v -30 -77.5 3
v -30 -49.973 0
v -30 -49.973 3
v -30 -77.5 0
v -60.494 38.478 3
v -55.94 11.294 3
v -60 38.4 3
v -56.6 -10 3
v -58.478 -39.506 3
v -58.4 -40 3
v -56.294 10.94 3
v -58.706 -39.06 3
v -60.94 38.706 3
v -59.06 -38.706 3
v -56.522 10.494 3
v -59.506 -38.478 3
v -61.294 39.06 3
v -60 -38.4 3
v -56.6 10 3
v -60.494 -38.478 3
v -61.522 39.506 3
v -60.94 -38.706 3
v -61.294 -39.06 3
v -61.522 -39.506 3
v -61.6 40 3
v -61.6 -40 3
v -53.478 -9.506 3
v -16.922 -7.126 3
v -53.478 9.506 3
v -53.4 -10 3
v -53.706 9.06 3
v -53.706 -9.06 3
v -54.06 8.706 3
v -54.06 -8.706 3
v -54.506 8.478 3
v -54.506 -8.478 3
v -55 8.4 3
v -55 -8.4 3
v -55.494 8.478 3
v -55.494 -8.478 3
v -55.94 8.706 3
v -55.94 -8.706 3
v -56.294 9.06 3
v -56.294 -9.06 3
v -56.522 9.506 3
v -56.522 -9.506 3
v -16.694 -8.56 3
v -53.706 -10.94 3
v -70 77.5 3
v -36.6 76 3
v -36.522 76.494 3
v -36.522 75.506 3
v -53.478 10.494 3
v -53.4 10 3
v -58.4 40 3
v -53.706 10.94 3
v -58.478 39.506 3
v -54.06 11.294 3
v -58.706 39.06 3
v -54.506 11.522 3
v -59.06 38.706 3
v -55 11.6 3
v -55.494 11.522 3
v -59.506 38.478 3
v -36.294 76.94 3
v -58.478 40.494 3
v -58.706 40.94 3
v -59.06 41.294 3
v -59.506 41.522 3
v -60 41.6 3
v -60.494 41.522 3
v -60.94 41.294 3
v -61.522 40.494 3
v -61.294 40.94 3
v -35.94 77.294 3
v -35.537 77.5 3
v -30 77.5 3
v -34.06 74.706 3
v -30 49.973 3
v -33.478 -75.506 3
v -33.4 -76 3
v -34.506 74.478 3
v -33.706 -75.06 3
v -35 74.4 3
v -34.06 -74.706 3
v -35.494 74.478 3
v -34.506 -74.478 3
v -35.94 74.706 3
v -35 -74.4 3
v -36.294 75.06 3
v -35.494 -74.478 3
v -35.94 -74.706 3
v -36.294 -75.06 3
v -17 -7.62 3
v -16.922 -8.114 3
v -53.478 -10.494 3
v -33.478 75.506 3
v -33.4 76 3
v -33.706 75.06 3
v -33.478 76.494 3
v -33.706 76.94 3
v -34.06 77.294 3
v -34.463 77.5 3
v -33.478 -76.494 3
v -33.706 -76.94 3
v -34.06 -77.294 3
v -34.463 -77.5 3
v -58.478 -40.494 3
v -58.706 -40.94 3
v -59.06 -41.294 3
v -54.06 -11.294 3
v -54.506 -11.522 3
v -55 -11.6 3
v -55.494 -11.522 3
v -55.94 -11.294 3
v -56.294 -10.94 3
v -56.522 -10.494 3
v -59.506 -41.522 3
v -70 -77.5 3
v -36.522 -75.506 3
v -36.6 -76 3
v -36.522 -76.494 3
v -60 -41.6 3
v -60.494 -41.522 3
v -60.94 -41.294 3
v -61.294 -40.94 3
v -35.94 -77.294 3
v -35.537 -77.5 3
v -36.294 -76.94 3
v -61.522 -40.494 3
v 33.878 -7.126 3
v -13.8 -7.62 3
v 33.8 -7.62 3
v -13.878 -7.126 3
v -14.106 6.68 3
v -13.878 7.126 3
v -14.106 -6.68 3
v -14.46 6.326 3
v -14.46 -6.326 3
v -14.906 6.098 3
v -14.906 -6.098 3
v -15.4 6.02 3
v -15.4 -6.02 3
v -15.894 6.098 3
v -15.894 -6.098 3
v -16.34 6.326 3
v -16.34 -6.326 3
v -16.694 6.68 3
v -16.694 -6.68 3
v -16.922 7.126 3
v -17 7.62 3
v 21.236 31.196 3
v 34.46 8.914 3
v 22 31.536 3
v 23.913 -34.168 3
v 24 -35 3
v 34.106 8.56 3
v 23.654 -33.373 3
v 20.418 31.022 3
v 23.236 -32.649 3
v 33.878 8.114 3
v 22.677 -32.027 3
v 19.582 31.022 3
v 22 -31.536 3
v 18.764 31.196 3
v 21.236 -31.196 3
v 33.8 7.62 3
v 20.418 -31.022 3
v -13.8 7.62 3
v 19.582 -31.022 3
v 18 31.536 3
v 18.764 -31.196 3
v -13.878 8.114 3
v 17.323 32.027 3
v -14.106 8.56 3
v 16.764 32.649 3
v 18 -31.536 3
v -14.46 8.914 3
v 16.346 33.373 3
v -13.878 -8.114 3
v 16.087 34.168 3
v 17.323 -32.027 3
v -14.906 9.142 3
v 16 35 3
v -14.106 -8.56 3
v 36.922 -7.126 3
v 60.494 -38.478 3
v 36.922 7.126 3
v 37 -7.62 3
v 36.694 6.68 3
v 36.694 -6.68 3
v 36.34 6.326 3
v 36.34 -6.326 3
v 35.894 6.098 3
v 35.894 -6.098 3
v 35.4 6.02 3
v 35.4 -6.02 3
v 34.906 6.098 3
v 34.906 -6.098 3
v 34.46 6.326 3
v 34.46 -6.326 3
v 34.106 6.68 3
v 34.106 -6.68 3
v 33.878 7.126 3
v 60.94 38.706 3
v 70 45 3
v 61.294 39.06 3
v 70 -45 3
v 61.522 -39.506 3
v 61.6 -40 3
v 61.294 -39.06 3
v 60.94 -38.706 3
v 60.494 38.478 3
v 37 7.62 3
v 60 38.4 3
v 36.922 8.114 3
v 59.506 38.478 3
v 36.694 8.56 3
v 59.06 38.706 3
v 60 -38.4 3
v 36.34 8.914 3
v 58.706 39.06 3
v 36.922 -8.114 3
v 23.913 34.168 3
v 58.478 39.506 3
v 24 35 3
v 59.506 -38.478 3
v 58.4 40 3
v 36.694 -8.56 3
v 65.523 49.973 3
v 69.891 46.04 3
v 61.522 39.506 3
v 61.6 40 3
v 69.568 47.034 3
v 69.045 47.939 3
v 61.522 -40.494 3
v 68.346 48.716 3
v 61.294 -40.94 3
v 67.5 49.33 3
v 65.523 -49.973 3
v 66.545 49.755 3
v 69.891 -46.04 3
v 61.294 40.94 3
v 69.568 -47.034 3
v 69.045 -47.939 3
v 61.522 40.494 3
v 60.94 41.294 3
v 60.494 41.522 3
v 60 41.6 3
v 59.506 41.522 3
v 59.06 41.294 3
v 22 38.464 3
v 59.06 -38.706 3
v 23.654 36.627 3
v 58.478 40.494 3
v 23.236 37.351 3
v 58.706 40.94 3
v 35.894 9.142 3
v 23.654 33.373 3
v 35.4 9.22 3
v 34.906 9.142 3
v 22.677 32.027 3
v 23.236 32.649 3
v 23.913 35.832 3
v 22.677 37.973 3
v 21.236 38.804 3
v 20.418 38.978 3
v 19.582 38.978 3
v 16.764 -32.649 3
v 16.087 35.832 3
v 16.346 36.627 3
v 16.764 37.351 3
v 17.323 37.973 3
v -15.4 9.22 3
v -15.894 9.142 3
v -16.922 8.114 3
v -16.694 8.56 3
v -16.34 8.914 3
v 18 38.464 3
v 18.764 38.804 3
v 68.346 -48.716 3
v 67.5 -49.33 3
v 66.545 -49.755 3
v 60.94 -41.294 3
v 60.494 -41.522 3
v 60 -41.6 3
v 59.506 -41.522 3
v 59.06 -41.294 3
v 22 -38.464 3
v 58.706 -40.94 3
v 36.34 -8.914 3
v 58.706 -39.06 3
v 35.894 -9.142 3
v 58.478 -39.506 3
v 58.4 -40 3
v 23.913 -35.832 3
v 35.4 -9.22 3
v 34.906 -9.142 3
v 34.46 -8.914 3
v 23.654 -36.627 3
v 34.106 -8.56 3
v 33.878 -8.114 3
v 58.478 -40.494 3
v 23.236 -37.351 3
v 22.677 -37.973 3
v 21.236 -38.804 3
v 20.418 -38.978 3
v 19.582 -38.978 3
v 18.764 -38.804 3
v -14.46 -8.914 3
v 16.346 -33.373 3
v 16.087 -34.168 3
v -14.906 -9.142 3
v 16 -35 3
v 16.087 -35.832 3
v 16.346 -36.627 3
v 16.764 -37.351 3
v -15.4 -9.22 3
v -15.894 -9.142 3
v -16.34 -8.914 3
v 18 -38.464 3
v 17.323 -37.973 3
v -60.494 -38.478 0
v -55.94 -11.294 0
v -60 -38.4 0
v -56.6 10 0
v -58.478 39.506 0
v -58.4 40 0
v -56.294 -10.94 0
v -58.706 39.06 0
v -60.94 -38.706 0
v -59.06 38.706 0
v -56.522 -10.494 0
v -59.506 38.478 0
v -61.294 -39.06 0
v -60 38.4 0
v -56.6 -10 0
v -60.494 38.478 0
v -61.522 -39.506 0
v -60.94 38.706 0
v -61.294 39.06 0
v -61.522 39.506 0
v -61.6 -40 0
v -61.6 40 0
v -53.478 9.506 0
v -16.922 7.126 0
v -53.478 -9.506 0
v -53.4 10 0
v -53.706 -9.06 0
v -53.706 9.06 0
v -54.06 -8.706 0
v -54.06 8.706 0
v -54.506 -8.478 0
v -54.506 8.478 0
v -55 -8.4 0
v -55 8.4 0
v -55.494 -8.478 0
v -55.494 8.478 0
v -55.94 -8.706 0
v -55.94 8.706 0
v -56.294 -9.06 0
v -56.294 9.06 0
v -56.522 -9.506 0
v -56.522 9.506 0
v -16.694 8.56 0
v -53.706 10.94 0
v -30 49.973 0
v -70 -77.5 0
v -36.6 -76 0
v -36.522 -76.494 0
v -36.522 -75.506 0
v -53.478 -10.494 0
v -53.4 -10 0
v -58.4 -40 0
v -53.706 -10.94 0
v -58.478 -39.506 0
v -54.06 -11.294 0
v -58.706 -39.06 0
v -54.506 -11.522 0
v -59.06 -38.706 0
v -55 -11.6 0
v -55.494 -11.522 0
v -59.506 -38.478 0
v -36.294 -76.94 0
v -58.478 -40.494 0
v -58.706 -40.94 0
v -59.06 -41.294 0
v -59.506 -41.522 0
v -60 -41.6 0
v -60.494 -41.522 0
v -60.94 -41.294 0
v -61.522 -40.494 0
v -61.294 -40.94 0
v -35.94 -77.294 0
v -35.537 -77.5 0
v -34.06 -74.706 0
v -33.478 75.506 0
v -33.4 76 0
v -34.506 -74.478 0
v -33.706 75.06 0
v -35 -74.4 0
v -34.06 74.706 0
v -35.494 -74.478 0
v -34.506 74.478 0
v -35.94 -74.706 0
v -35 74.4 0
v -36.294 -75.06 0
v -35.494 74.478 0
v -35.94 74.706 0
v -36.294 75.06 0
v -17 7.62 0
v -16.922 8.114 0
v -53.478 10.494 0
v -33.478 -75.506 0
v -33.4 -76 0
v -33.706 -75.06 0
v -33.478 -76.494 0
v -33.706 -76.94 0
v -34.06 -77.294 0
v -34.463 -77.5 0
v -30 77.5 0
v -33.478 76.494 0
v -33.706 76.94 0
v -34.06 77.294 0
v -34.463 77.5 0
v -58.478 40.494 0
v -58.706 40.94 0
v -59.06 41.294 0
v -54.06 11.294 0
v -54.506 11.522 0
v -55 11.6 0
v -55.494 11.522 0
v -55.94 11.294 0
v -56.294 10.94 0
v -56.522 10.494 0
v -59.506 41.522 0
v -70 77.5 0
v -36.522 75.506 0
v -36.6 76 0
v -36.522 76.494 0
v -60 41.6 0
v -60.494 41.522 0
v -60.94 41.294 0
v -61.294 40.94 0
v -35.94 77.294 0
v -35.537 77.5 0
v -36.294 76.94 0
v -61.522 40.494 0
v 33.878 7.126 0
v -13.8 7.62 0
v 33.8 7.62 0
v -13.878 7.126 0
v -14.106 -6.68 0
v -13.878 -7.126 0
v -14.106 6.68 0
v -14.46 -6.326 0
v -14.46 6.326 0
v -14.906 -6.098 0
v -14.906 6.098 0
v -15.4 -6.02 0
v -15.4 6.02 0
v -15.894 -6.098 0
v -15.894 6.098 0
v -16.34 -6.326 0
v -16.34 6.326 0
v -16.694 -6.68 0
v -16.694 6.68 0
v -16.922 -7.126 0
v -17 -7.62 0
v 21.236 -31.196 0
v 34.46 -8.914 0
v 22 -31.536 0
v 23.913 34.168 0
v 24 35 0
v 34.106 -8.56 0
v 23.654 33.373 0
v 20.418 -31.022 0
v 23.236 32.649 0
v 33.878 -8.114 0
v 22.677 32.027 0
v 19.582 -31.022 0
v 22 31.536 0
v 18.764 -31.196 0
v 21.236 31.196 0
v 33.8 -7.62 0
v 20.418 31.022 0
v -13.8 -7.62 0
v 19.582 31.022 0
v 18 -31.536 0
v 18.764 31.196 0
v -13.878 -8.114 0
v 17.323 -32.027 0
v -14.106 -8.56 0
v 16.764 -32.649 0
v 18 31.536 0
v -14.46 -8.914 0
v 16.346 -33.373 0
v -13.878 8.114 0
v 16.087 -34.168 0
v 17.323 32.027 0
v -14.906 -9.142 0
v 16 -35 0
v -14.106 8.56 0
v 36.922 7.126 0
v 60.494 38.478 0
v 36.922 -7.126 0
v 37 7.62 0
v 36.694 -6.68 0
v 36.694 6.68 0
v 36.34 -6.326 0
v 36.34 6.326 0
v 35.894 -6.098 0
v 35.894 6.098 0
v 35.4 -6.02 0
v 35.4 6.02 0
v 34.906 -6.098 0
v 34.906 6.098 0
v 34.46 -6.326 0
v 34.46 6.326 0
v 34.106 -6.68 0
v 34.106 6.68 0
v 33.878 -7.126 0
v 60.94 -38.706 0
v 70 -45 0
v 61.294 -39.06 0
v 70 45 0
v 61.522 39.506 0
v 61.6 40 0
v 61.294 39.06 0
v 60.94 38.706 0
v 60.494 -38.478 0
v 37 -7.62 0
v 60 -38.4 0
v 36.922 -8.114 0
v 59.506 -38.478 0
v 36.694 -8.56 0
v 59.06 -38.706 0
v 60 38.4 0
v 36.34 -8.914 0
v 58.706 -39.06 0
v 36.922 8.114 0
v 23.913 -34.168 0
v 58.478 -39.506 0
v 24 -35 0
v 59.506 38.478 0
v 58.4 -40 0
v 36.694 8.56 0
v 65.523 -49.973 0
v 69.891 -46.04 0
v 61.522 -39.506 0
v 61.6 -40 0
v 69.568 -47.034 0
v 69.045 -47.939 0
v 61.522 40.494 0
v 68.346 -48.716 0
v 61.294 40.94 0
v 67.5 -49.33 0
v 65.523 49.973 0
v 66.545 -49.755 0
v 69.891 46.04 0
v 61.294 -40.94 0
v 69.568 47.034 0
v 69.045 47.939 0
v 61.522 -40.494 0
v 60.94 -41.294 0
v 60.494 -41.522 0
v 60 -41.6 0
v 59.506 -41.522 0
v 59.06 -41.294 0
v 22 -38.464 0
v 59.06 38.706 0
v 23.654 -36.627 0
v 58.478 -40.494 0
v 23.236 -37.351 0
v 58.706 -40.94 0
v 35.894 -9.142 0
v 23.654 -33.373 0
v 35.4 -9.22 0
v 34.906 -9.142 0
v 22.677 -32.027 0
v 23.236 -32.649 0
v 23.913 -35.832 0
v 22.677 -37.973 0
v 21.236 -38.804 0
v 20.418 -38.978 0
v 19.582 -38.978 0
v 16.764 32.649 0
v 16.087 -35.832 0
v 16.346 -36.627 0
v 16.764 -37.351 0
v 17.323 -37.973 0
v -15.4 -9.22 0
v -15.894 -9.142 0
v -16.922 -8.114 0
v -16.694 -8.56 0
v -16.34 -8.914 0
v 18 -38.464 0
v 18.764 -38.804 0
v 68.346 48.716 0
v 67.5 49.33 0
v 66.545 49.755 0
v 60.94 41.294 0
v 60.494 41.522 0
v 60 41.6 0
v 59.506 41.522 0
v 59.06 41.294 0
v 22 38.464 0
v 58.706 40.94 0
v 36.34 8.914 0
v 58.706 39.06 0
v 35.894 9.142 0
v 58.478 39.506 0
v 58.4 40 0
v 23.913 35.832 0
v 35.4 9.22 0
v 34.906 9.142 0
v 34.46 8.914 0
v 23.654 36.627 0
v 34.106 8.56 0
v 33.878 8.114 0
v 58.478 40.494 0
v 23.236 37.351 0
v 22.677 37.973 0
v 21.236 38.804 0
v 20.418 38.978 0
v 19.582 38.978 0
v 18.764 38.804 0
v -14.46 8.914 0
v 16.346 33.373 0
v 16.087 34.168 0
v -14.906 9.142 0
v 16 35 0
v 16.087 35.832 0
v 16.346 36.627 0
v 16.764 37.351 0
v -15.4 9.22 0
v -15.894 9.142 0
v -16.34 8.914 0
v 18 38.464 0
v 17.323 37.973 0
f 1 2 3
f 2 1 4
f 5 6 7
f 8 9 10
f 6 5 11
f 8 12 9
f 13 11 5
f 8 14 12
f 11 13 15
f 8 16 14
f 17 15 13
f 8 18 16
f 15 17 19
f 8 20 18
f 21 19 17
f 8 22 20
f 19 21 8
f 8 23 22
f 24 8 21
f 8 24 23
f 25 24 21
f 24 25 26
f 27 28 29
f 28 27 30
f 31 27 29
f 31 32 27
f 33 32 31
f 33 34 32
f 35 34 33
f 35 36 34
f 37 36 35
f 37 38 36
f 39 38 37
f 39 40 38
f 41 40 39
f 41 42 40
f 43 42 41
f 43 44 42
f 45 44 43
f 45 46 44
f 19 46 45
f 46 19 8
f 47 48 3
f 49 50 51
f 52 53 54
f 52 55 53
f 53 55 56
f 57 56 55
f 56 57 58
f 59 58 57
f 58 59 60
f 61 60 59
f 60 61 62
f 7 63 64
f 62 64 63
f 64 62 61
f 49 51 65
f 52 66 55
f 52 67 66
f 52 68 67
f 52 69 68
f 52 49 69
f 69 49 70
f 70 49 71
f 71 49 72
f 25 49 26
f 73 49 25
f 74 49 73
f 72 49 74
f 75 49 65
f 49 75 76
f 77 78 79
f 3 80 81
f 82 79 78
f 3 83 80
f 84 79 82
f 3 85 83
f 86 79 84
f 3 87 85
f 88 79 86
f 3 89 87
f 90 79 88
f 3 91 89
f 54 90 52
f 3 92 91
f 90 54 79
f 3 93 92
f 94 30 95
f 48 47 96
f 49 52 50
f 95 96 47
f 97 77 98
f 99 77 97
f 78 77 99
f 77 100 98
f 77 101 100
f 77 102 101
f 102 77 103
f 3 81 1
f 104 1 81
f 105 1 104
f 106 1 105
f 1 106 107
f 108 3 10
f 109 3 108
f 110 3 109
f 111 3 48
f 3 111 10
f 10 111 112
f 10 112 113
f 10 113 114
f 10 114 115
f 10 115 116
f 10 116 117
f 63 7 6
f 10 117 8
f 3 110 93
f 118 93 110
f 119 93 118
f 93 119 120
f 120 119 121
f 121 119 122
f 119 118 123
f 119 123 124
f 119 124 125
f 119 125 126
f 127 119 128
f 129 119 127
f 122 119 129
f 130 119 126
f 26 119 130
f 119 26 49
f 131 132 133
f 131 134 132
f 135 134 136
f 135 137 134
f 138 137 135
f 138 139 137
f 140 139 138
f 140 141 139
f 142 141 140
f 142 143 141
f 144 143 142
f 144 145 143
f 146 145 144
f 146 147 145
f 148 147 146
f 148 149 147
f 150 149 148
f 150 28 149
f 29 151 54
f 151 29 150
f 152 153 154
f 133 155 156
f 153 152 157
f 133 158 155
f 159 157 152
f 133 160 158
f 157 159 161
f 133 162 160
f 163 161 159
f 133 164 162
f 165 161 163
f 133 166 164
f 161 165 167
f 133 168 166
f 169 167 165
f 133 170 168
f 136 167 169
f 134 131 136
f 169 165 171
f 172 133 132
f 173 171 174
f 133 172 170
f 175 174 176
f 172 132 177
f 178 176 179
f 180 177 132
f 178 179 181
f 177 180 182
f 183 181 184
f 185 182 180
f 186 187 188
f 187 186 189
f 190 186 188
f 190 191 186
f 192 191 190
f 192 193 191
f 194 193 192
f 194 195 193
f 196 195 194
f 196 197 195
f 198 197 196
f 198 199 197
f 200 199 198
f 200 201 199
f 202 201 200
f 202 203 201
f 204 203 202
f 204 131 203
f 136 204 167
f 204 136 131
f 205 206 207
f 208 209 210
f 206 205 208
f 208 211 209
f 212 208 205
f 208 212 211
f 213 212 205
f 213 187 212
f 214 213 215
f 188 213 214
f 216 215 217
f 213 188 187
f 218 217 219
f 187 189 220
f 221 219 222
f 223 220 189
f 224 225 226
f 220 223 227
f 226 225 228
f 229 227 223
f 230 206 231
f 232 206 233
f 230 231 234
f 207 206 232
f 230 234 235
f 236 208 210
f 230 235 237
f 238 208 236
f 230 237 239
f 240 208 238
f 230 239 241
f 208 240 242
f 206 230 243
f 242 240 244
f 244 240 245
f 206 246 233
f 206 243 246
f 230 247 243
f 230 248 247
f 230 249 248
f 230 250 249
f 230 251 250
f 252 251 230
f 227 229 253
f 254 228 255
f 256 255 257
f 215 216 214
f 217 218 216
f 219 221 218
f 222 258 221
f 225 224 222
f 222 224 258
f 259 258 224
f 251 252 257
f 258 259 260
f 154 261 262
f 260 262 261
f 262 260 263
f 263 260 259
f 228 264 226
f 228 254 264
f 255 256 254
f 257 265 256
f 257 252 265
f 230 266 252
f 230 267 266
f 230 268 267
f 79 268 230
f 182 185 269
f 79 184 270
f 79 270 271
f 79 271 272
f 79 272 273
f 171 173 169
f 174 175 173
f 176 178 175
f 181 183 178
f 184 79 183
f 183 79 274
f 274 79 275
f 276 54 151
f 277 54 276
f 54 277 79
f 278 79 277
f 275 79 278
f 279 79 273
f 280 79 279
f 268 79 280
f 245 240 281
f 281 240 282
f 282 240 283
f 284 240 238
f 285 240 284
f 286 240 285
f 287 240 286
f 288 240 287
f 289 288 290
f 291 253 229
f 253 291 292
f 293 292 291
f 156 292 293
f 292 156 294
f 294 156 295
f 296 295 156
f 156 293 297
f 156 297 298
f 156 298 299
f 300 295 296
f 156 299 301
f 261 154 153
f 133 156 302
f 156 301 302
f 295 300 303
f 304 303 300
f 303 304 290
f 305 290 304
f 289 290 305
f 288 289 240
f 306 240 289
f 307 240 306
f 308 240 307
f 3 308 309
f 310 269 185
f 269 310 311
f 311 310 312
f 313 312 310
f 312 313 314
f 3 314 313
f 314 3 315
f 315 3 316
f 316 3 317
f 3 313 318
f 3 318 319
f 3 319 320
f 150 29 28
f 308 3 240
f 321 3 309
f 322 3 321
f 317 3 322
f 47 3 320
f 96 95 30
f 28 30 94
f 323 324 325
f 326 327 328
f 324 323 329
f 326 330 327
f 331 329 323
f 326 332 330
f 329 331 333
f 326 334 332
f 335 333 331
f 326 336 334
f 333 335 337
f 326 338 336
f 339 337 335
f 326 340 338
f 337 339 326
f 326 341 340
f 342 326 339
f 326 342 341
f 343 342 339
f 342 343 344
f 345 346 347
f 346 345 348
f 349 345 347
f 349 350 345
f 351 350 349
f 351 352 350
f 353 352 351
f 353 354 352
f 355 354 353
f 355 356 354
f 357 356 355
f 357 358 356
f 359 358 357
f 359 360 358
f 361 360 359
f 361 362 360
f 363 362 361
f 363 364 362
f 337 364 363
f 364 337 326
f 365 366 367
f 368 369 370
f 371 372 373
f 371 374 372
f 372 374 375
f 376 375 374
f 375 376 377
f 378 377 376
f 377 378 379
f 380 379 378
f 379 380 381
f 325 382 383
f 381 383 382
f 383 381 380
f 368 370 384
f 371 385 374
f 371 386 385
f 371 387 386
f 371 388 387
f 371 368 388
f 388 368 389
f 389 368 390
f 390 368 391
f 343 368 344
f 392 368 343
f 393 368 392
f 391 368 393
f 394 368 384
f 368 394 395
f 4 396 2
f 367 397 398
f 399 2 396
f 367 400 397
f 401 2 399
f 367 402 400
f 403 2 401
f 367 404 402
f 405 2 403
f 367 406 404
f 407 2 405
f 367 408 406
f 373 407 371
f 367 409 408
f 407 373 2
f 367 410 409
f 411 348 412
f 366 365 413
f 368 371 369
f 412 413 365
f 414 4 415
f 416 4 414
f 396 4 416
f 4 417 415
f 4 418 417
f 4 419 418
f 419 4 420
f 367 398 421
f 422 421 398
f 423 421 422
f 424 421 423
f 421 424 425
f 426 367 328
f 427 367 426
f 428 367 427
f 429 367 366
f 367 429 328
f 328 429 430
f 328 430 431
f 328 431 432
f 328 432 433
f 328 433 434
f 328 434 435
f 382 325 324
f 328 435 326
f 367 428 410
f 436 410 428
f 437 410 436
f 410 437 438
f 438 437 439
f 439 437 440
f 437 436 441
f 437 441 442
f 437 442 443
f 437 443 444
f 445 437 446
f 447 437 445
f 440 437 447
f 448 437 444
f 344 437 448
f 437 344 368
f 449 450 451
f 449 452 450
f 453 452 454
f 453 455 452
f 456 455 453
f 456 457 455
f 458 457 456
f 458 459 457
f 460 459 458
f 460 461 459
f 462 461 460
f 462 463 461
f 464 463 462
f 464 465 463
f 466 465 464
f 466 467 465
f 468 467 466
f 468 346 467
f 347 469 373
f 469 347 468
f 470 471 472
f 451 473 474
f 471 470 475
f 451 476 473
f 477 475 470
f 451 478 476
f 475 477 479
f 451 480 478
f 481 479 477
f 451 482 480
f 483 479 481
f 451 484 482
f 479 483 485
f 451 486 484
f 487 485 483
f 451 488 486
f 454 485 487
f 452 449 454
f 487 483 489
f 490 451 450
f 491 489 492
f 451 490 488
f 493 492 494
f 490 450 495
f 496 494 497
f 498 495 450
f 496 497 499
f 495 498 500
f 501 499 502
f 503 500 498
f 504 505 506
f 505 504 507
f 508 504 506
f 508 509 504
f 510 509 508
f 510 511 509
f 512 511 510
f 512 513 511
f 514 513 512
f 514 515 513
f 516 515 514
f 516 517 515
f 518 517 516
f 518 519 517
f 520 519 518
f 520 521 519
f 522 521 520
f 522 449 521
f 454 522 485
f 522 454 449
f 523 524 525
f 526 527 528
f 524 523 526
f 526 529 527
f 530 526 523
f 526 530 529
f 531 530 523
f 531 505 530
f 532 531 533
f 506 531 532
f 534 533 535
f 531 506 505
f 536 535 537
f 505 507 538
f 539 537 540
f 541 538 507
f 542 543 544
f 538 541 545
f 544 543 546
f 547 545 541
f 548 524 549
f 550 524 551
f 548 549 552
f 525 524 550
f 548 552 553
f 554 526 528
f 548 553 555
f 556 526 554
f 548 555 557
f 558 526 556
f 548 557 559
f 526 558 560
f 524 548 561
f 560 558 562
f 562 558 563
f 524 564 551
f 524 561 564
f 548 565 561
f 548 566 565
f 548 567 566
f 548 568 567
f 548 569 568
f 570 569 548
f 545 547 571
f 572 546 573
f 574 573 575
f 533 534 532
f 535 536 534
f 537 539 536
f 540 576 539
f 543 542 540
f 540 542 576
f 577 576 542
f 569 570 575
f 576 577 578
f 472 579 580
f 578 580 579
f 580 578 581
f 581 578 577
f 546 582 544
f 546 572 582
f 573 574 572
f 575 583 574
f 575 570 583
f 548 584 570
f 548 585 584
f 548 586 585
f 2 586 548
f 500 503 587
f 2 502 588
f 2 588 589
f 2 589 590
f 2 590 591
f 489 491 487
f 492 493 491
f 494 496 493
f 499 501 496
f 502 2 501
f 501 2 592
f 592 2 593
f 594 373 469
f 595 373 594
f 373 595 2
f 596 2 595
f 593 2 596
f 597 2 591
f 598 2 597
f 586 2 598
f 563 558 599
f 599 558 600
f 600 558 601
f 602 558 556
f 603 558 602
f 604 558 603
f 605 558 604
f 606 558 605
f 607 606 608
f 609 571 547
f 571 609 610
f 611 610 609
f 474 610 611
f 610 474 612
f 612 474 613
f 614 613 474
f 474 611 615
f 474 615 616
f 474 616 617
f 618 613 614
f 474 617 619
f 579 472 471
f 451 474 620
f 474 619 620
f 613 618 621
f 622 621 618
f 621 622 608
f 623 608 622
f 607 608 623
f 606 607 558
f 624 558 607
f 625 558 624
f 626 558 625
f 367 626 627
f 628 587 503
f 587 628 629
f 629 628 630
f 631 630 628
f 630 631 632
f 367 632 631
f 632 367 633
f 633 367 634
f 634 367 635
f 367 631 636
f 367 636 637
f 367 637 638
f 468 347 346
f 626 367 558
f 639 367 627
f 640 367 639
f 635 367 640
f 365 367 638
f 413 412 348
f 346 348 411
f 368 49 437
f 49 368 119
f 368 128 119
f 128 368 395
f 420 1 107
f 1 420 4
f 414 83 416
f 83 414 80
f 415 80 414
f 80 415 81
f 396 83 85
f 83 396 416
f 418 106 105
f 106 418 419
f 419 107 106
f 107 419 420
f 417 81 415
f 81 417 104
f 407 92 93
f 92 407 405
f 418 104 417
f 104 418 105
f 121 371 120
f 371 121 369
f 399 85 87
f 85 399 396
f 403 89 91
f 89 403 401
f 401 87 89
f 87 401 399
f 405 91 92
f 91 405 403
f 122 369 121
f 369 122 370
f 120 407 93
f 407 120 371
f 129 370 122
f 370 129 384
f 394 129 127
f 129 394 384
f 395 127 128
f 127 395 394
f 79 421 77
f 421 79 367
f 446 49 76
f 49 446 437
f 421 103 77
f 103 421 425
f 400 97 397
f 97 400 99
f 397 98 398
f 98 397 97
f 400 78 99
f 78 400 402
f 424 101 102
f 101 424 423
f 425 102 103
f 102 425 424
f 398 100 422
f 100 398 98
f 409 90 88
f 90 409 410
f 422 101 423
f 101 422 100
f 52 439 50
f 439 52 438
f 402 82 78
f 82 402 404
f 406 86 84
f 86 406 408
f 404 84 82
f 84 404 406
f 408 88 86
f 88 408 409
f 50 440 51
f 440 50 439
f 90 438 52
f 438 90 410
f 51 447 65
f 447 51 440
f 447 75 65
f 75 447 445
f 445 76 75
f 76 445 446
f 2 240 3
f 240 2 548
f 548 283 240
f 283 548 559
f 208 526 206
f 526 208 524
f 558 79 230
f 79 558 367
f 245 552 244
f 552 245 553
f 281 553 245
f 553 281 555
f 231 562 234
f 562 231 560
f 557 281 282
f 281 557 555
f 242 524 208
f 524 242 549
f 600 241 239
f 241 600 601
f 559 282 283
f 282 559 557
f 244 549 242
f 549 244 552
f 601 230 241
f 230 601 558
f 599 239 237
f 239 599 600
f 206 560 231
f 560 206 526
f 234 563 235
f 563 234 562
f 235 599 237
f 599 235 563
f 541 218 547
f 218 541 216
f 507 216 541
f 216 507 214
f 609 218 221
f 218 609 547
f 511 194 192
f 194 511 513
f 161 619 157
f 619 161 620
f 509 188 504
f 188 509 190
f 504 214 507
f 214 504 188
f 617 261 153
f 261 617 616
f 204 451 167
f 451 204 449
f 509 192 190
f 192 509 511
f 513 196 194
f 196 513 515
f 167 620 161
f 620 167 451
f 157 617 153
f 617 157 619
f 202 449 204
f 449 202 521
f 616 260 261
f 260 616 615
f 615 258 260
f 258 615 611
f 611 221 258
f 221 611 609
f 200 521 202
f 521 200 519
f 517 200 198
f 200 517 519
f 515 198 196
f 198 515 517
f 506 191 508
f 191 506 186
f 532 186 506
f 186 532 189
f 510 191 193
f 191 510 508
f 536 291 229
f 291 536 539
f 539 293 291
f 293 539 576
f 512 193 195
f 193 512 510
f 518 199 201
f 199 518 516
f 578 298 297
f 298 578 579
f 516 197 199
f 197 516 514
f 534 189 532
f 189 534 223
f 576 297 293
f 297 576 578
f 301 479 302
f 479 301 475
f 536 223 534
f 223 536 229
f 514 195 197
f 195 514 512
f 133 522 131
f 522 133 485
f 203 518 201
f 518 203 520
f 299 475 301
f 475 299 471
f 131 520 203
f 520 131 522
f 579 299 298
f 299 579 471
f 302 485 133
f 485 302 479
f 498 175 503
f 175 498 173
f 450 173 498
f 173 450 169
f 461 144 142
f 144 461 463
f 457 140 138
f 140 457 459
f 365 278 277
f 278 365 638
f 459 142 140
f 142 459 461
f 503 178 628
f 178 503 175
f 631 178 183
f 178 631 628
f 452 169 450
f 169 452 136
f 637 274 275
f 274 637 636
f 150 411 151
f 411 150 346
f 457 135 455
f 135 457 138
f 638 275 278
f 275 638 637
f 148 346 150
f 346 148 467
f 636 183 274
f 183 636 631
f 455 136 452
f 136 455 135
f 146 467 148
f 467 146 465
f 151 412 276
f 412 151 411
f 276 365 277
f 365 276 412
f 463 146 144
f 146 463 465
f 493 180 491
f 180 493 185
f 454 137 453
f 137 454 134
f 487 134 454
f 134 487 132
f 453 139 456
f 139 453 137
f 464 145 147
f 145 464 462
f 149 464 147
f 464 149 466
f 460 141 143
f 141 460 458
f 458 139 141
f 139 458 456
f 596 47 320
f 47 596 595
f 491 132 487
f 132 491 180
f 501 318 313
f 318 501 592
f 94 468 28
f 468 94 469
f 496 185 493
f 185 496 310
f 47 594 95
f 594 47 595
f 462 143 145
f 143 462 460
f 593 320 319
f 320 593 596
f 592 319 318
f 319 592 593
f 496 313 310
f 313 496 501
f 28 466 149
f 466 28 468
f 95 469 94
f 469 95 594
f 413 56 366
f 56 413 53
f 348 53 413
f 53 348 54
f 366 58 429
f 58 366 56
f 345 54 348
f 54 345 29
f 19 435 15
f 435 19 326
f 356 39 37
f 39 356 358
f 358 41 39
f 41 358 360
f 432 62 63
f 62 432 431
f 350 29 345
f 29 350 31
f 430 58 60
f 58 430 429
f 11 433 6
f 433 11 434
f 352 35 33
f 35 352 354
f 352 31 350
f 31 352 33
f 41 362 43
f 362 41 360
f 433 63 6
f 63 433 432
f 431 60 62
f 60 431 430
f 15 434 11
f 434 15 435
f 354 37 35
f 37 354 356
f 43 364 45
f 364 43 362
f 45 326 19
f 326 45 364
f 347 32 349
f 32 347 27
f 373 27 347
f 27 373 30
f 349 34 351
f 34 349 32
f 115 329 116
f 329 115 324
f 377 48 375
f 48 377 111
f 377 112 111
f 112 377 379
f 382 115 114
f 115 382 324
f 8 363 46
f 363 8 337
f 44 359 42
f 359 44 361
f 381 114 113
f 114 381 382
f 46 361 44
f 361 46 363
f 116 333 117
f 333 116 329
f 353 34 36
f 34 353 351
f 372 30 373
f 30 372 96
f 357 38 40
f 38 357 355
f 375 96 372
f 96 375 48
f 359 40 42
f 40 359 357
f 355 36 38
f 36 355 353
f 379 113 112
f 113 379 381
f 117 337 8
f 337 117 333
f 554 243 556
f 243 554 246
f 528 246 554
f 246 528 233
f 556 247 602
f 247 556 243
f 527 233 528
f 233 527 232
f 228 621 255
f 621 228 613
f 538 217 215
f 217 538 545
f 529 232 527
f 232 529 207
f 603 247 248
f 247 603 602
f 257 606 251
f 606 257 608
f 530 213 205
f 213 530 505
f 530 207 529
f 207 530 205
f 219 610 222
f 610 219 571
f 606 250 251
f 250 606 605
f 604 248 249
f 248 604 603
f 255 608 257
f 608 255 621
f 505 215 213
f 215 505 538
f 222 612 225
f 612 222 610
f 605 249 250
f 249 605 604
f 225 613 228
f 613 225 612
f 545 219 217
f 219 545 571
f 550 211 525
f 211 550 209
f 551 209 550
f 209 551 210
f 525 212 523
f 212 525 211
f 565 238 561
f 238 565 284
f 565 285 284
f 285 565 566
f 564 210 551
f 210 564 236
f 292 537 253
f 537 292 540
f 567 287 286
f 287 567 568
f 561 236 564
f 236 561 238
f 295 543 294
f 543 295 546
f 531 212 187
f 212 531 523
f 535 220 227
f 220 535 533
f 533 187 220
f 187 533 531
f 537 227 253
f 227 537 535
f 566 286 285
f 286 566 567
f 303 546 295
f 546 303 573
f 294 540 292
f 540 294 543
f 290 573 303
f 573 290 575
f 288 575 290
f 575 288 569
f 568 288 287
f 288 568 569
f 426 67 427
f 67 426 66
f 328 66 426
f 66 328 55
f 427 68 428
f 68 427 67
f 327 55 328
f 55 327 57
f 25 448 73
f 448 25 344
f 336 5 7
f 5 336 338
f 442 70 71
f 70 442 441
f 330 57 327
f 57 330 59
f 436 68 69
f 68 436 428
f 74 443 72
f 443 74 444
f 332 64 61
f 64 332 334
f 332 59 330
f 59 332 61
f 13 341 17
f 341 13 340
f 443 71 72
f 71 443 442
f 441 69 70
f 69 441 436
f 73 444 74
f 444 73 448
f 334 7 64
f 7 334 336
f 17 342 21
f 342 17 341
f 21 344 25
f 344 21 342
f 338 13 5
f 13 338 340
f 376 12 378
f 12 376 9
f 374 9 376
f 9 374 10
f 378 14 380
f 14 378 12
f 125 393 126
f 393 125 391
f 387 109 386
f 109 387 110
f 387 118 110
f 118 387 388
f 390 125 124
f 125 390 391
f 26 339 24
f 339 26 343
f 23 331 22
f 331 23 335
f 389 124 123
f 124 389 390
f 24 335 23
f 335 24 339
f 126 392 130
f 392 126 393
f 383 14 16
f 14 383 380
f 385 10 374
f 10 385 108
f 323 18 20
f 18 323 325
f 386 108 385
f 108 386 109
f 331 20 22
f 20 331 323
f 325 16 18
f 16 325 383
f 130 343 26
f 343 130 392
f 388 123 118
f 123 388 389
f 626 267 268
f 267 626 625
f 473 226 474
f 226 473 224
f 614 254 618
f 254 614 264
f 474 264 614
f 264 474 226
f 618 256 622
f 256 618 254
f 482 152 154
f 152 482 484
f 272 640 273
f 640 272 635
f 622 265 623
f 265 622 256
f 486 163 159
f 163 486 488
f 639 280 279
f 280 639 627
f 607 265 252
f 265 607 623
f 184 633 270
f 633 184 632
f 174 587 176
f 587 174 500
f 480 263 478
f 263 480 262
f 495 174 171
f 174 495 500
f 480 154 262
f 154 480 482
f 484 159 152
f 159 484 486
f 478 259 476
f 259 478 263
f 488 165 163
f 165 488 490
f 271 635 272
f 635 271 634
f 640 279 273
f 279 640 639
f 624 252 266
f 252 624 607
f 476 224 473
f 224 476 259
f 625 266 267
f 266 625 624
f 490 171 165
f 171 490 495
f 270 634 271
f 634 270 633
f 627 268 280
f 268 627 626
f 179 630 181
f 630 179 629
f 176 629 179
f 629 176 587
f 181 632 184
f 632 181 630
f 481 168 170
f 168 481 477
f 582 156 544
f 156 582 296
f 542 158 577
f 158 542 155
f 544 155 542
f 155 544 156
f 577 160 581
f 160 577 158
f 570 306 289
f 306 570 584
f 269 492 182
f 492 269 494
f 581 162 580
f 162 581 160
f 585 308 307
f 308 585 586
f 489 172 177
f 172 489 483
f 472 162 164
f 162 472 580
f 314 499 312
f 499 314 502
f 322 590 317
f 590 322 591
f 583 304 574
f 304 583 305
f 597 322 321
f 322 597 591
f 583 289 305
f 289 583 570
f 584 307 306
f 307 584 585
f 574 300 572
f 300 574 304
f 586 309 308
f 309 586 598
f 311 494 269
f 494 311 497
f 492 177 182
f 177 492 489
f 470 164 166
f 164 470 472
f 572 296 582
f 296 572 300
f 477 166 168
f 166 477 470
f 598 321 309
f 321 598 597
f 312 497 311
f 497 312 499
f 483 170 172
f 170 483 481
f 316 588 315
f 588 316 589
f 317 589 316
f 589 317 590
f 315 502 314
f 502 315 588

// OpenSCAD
/*
 * ArloBot - 2-Wheel Differential Drive Robot Chassis
 *
 * Parametric OpenSCAD design for a simple robot chassis
 * Compatible with Arduino UNO R4 WiFi + L298P Motor Shield
 *
 * To generate STL files:
 * 1. Open in OpenSCAD
 * 2. Set 'part' variable to the part you want to export
 * 3. Press F6 to render, then Export as STL
 */

// ===== CONFIGURATION PARAMETERS =====
// Adjust these to customize your robot

// Which part to render (for STL export)
part = "bottom_plate"; // Options: "bottom_plate", "motor_mount", "caster_bracket", "top_plate", "assembly"

// Chassis dimensions
chassis_length = 140;    // Length of the base plate (mm)
chassis_width = 100;     // Width of the base plate (mm)
chassis_thickness = 3;   // Thickness of plates (mm)

// Motor parameters
motor_diameter = 37;     // DC motor diameter (mm)
motor_length = 70;       // Motor body length (mm)
motor_shaft_length = 15; // Length of motor shaft extending out (mm)
motor_mount_screw_distance = 32; // Distance between motor mounting holes
motor_height = 10;       // Height of motor center from ground (mm)

// Wheel parameters
wheel_diameter = 65;     // Wheel diameter (mm)
wheel_width = 27;        // Wheel width (mm)
wheel_offset = 10;       // How far wheels stick out from chassis edge (mm)

// Arduino UNO dimensions
arduino_length = 68.6;
arduino_width = 53.4;
arduino_hole_spacing_length = 50.8;
arduino_hole_spacing_width = 15.24;
arduino_hole_diameter = 3.2;

// Battery compartment
battery_length = 80;     // Adjustable for different battery types
battery_width = 60;
battery_height = 20;

// Caster wheel
caster_diameter = 15;    // Small ball caster or wheel
caster_mount_holes = 20; // Distance between mounting holes

// Standoff parameters
standoff_height = 30;    // Height between bottom and top plates
standoff_diameter = 6;
standoff_hole = 3.2;     // M3 screw hole

// Print tolerance
tolerance = 0.2;

// ===== RENDERING LOGIC =====

if (part == "bottom_plate") {
    bottom_plate();
} else if (part == "motor_mount") {
    motor_mount();
} else if (part == "caster_bracket") {
    caster_bracket();
} else if (part == "top_plate") {
    top_plate();
} else if (part == "assembly") {
    assembly();
}

// ===== MODULES =====

module bottom_plate() {
    difference() {
        union() {
            // Main chassis plate
            rounded_rectangle(chassis_length, chassis_width, chassis_thickness, 5);

            // Motor mount tabs (left and right)
            translate([-chassis_length/2, -chassis_width/2 - wheel_offset, 0])
                motor_mount_tab();

            translate([-chassis_length/2, chassis_width/2 + wheel_offset, 0])
                mirror([0, 1, 0])
                motor_mount_tab();
        }

        // Arduino mounting holes
        translate([10, 0, -1])
            arduino_mounting_holes();

        // Caster mounting holes (at rear center)
        translate([-chassis_length/2 + 15, 0, -1])
            caster_mounting_holes();

        // Standoff holes at corners
        translate([chassis_length/2 - 10, chassis_width/2 - 10, -1])
            cylinder(d=standoff_hole, h=chassis_thickness + 2, $fn=20);
        translate([chassis_length/2 - 10, -chassis_width/2 + 10, -1])
            cylinder(d=standoff_hole, h=chassis_thickness + 2, $fn=20);
        translate([-chassis_length/2 + 10, chassis_width/2 - 10, -1])
            cylinder(d=standoff_hole, h=chassis_thickness + 2, $fn=20);
        translate([-chassis_length/2 + 10, -chassis_width/2 + 10, -1])
            cylinder(d=standoff_hole, h=chassis_thickness + 2, $fn=20);

        // Cable management holes
        translate([20, chassis_width/2 - 15, -1])
            cylinder(d=8, h=chassis_thickness + 2, $fn=30);
        translate([20, -chassis_width/2 + 15, -1])
            cylinder(d=8, h=chassis_thickness + 2, $fn=30);
    }
}

module motor_mount_tab() {
    // Extends outward for motor mounting
    tab_length = 40;
    tab_width = 35;

    translate([tab_length/2, 0, chassis_thickness/2])
    difference() {
        cube([tab_length, tab_width, chassis_thickness], center=true);

        // Motor mounting holes
        translate([15, motor_mount_screw_distance/2, 0])
            cylinder(d=3.2, h=chassis_thickness + 2, center=true, $fn=20);
        translate([15, -motor_mount_screw_distance/2, 0])
            cylinder(d=3.2, h=chassis_thickness + 2, center=true, $fn=20);
    }
}

module motor_mount() {
    // L-bracket to hold motor
    bracket_height = 45;
    bracket_thickness = 3;
    bracket_length = 45;

    difference() {
        union() {
            // Vertical part
            cube([bracket_length, bracket_thickness, bracket_height]);

            // Horizontal mounting flange
            cube([bracket_length, 35, bracket_thickness]);
        }

        // Motor shaft hole
        translate([bracket_length/2, -1, bracket_height - motor_height])
            rotate([-90, 0, 0])
            cylinder(d=motor_diameter + tolerance, h=bracket_thickness + 2, $fn=50);

        // Mounting screw holes (match motor_mount_tab)
        translate([bracket_length/2 + 15, 35/2 + motor_mount_screw_distance/2, -1])
            cylinder(d=3.2, h=bracket_thickness + 2, $fn=20);
        translate([bracket_length/2 + 15, 35/2 - motor_mount_screw_distance/2, -1])
            cylinder(d=3.2, h=bracket_thickness + 2, $fn=20);

        // Motor mounting screws (on vertical face)
        translate([bracket_length/2, bracket_thickness + 1, bracket_height - motor_height])
            rotate([90, 0, 0])
            cylinder(d=3, h=bracket_thickness + 2, $fn=20);
    }
}

module caster_bracket() {
    // Simple bracket for ball caster
    bracket_size = 25;
    bracket_thickness = 3;
    bracket_height = 20;

    difference() {
        union() {
            // Base
            cube([bracket_size, bracket_size, bracket_thickness]);

            // Support posts
            translate([bracket_size/2, bracket_size/2, 0])
                cylinder(d=12, h=bracket_height, $fn=30);
        }

        // Mounting holes for chassis
        translate([bracket_size/2, bracket_size/2 + caster_mount_holes/2, -1])
            cylinder(d=3.2, h=bracket_thickness + 2, $fn=20);
        translate([bracket_size/2, bracket_size/2 - caster_mount_holes/2, -1])
            cylinder(d=3.2, h=bracket_thickness + 2, $fn=20);

        // Caster mounting hole (through post)
        translate([bracket_size/2, bracket_size/2, bracket_height/2])
            cylinder(d=3.2, h=bracket_height + 2, center=true, $fn=20);
    }
}

module top_plate() {
    // Optional top cover plate
    difference() {
        rounded_rectangle(chassis_length - 10, chassis_width - 10, chassis_thickness, 5);

        // Standoff holes at corners
        translate([chassis_length/2 - 15, chassis_width/2 - 15, -1])
            cylinder(d=standoff_hole, h=chassis_thickness + 2, $fn=20);
        translate([chassis_length/2 - 15, -chassis_width/2 + 15, -1])
            cylinder(d=standoff_hole, h=chassis_thickness + 2, $fn=20);
        translate([-chassis_length/2 + 15, chassis_width/2 - 15, -1])
            cylinder(d=standoff_hole, h=chassis_thickness + 2, $fn=20);
        translate([-chassis_length/2 + 15, -chassis_width/2 + 15, -1])
            cylinder(d=standoff_hole, h=chassis_thickness + 2, $fn=20);

        // Ventilation holes
        for (x = [-30:15:30]) {
            for (y = [-20:15:20]) {
                translate([x, y, -1])
                    cylinder(d=5, h=chassis_thickness + 2, $fn=20);
            }
        }
    }
}

module arduino_mounting_holes() {
    // Arduino UNO R4 mounting holes
    hole_x_offset = arduino_hole_spacing_length / 2;
    hole_y_offset = arduino_hole_spacing_width / 2;

    translate([hole_x_offset, hole_y_offset, 0])
        cylinder(d=arduino_hole_diameter, h=chassis_thickness + 2, $fn=20);
    translate([hole_x_offset, -hole_y_offset, 0])
        cylinder(d=arduino_hole_diameter, h=chassis_thickness + 2, $fn=20);
    translate([-hole_x_offset, hole_y_offset, 0])
        cylinder(d=arduino_hole_diameter, h=chassis_thickness + 2, $fn=20);
    translate([-hole_x_offset, -hole_y_offset, 0])
        cylinder(d=arduino_hole_diameter, h=chassis_thickness + 2, $fn=20);
}

module caster_mounting_holes() {
    translate([0, caster_mount_holes/2, 0])
        cylinder(d=3.2, h=chassis_thickness + 2, $fn=20);
    translate([0, -caster_mount_holes/2, 0])
        cylinder(d=3.2, h=chassis_thickness + 2, $fn=20);
}

module rounded_rectangle(length, width, height, radius) {
    // Creates a rectangle with rounded corners
    hull() {
        translate([length/2 - radius, width/2 - radius, 0])
            cylinder(r=radius, h=height, $fn=30);
        translate([length/2 - radius, -width/2 + radius, 0])
            cylinder(r=radius, h=height, $fn=30);
        translate([-length/2 + radius, width/2 - radius, 0])
            cylinder(r=radius, h=height, $fn=30);
        translate([-length/2 + radius, -width/2 + radius, 0])
            cylinder(r=radius, h=height, $fn=30);
    }
}

module assembly() {
    // Full assembly view for visualization
    color("lightblue")
        bottom_plate();

    // Motor mounts (left and right)
    color("orange")
    translate([-chassis_length/2 + 5, -chassis_width/2 - wheel_offset, chassis_thickness]) {
        rotate([90, 0, 90])
            motor_mount();
    }

    color("orange")
    translate([-chassis_length/2 + 5, chassis_width/2 + wheel_offset, chassis_thickness]) {
        rotate([90, 0, 90])
            mirror([0, 1, 0])
            motor_mount();
    }

    // Caster bracket
    color("green")
    translate([-chassis_length/2 + 15 - 12.5, -12.5, chassis_thickness])
        caster_bracket();

    // Top plate (elevated on standoffs)
    color("lightblue", alpha=0.5)
    translate([0, 0, chassis_thickness + standoff_height])
        top_plate();

    // Visualization of motors (not printable)
    color("gray", alpha=0.3) {
        translate([-chassis_length/2 + 5 + motor_length/2, -chassis_width/2 - wheel_offset, chassis_thickness + motor_height])
            rotate([0, 90, 0])
            cylinder(d=motor_diameter, h=motor_length, center=true, $fn=40);

        translate([-chassis_length/2 + 5 + motor_length/2, chassis_width/2 + wheel_offset, chassis_thickness + motor_height])
            rotate([0, 90, 0])
            cylinder(d=motor_diameter, h=motor_length, center=true, $fn=40);
    }

    // Visualization of wheels (not printable)
    color("black", alpha=0.3) {
        translate([-chassis_length/2 + 5 + motor_length + motor_shaft_length, -chassis_width/2 - wheel_offset, chassis_thickness + motor_height])
            rotate([0, 90, 0])
            cylinder(d=wheel_diameter, h=wheel_width, center=true, $fn=60);

        translate([-chassis_length/2 + 5 + motor_length + motor_shaft_length, chassis_width/2 + wheel_offset, chassis_thickness + motor_height])
            rotate([0, 90, 0])
            cylinder(d=wheel_diameter, h=wheel_width, center=true, $fn=60);
    }
}
